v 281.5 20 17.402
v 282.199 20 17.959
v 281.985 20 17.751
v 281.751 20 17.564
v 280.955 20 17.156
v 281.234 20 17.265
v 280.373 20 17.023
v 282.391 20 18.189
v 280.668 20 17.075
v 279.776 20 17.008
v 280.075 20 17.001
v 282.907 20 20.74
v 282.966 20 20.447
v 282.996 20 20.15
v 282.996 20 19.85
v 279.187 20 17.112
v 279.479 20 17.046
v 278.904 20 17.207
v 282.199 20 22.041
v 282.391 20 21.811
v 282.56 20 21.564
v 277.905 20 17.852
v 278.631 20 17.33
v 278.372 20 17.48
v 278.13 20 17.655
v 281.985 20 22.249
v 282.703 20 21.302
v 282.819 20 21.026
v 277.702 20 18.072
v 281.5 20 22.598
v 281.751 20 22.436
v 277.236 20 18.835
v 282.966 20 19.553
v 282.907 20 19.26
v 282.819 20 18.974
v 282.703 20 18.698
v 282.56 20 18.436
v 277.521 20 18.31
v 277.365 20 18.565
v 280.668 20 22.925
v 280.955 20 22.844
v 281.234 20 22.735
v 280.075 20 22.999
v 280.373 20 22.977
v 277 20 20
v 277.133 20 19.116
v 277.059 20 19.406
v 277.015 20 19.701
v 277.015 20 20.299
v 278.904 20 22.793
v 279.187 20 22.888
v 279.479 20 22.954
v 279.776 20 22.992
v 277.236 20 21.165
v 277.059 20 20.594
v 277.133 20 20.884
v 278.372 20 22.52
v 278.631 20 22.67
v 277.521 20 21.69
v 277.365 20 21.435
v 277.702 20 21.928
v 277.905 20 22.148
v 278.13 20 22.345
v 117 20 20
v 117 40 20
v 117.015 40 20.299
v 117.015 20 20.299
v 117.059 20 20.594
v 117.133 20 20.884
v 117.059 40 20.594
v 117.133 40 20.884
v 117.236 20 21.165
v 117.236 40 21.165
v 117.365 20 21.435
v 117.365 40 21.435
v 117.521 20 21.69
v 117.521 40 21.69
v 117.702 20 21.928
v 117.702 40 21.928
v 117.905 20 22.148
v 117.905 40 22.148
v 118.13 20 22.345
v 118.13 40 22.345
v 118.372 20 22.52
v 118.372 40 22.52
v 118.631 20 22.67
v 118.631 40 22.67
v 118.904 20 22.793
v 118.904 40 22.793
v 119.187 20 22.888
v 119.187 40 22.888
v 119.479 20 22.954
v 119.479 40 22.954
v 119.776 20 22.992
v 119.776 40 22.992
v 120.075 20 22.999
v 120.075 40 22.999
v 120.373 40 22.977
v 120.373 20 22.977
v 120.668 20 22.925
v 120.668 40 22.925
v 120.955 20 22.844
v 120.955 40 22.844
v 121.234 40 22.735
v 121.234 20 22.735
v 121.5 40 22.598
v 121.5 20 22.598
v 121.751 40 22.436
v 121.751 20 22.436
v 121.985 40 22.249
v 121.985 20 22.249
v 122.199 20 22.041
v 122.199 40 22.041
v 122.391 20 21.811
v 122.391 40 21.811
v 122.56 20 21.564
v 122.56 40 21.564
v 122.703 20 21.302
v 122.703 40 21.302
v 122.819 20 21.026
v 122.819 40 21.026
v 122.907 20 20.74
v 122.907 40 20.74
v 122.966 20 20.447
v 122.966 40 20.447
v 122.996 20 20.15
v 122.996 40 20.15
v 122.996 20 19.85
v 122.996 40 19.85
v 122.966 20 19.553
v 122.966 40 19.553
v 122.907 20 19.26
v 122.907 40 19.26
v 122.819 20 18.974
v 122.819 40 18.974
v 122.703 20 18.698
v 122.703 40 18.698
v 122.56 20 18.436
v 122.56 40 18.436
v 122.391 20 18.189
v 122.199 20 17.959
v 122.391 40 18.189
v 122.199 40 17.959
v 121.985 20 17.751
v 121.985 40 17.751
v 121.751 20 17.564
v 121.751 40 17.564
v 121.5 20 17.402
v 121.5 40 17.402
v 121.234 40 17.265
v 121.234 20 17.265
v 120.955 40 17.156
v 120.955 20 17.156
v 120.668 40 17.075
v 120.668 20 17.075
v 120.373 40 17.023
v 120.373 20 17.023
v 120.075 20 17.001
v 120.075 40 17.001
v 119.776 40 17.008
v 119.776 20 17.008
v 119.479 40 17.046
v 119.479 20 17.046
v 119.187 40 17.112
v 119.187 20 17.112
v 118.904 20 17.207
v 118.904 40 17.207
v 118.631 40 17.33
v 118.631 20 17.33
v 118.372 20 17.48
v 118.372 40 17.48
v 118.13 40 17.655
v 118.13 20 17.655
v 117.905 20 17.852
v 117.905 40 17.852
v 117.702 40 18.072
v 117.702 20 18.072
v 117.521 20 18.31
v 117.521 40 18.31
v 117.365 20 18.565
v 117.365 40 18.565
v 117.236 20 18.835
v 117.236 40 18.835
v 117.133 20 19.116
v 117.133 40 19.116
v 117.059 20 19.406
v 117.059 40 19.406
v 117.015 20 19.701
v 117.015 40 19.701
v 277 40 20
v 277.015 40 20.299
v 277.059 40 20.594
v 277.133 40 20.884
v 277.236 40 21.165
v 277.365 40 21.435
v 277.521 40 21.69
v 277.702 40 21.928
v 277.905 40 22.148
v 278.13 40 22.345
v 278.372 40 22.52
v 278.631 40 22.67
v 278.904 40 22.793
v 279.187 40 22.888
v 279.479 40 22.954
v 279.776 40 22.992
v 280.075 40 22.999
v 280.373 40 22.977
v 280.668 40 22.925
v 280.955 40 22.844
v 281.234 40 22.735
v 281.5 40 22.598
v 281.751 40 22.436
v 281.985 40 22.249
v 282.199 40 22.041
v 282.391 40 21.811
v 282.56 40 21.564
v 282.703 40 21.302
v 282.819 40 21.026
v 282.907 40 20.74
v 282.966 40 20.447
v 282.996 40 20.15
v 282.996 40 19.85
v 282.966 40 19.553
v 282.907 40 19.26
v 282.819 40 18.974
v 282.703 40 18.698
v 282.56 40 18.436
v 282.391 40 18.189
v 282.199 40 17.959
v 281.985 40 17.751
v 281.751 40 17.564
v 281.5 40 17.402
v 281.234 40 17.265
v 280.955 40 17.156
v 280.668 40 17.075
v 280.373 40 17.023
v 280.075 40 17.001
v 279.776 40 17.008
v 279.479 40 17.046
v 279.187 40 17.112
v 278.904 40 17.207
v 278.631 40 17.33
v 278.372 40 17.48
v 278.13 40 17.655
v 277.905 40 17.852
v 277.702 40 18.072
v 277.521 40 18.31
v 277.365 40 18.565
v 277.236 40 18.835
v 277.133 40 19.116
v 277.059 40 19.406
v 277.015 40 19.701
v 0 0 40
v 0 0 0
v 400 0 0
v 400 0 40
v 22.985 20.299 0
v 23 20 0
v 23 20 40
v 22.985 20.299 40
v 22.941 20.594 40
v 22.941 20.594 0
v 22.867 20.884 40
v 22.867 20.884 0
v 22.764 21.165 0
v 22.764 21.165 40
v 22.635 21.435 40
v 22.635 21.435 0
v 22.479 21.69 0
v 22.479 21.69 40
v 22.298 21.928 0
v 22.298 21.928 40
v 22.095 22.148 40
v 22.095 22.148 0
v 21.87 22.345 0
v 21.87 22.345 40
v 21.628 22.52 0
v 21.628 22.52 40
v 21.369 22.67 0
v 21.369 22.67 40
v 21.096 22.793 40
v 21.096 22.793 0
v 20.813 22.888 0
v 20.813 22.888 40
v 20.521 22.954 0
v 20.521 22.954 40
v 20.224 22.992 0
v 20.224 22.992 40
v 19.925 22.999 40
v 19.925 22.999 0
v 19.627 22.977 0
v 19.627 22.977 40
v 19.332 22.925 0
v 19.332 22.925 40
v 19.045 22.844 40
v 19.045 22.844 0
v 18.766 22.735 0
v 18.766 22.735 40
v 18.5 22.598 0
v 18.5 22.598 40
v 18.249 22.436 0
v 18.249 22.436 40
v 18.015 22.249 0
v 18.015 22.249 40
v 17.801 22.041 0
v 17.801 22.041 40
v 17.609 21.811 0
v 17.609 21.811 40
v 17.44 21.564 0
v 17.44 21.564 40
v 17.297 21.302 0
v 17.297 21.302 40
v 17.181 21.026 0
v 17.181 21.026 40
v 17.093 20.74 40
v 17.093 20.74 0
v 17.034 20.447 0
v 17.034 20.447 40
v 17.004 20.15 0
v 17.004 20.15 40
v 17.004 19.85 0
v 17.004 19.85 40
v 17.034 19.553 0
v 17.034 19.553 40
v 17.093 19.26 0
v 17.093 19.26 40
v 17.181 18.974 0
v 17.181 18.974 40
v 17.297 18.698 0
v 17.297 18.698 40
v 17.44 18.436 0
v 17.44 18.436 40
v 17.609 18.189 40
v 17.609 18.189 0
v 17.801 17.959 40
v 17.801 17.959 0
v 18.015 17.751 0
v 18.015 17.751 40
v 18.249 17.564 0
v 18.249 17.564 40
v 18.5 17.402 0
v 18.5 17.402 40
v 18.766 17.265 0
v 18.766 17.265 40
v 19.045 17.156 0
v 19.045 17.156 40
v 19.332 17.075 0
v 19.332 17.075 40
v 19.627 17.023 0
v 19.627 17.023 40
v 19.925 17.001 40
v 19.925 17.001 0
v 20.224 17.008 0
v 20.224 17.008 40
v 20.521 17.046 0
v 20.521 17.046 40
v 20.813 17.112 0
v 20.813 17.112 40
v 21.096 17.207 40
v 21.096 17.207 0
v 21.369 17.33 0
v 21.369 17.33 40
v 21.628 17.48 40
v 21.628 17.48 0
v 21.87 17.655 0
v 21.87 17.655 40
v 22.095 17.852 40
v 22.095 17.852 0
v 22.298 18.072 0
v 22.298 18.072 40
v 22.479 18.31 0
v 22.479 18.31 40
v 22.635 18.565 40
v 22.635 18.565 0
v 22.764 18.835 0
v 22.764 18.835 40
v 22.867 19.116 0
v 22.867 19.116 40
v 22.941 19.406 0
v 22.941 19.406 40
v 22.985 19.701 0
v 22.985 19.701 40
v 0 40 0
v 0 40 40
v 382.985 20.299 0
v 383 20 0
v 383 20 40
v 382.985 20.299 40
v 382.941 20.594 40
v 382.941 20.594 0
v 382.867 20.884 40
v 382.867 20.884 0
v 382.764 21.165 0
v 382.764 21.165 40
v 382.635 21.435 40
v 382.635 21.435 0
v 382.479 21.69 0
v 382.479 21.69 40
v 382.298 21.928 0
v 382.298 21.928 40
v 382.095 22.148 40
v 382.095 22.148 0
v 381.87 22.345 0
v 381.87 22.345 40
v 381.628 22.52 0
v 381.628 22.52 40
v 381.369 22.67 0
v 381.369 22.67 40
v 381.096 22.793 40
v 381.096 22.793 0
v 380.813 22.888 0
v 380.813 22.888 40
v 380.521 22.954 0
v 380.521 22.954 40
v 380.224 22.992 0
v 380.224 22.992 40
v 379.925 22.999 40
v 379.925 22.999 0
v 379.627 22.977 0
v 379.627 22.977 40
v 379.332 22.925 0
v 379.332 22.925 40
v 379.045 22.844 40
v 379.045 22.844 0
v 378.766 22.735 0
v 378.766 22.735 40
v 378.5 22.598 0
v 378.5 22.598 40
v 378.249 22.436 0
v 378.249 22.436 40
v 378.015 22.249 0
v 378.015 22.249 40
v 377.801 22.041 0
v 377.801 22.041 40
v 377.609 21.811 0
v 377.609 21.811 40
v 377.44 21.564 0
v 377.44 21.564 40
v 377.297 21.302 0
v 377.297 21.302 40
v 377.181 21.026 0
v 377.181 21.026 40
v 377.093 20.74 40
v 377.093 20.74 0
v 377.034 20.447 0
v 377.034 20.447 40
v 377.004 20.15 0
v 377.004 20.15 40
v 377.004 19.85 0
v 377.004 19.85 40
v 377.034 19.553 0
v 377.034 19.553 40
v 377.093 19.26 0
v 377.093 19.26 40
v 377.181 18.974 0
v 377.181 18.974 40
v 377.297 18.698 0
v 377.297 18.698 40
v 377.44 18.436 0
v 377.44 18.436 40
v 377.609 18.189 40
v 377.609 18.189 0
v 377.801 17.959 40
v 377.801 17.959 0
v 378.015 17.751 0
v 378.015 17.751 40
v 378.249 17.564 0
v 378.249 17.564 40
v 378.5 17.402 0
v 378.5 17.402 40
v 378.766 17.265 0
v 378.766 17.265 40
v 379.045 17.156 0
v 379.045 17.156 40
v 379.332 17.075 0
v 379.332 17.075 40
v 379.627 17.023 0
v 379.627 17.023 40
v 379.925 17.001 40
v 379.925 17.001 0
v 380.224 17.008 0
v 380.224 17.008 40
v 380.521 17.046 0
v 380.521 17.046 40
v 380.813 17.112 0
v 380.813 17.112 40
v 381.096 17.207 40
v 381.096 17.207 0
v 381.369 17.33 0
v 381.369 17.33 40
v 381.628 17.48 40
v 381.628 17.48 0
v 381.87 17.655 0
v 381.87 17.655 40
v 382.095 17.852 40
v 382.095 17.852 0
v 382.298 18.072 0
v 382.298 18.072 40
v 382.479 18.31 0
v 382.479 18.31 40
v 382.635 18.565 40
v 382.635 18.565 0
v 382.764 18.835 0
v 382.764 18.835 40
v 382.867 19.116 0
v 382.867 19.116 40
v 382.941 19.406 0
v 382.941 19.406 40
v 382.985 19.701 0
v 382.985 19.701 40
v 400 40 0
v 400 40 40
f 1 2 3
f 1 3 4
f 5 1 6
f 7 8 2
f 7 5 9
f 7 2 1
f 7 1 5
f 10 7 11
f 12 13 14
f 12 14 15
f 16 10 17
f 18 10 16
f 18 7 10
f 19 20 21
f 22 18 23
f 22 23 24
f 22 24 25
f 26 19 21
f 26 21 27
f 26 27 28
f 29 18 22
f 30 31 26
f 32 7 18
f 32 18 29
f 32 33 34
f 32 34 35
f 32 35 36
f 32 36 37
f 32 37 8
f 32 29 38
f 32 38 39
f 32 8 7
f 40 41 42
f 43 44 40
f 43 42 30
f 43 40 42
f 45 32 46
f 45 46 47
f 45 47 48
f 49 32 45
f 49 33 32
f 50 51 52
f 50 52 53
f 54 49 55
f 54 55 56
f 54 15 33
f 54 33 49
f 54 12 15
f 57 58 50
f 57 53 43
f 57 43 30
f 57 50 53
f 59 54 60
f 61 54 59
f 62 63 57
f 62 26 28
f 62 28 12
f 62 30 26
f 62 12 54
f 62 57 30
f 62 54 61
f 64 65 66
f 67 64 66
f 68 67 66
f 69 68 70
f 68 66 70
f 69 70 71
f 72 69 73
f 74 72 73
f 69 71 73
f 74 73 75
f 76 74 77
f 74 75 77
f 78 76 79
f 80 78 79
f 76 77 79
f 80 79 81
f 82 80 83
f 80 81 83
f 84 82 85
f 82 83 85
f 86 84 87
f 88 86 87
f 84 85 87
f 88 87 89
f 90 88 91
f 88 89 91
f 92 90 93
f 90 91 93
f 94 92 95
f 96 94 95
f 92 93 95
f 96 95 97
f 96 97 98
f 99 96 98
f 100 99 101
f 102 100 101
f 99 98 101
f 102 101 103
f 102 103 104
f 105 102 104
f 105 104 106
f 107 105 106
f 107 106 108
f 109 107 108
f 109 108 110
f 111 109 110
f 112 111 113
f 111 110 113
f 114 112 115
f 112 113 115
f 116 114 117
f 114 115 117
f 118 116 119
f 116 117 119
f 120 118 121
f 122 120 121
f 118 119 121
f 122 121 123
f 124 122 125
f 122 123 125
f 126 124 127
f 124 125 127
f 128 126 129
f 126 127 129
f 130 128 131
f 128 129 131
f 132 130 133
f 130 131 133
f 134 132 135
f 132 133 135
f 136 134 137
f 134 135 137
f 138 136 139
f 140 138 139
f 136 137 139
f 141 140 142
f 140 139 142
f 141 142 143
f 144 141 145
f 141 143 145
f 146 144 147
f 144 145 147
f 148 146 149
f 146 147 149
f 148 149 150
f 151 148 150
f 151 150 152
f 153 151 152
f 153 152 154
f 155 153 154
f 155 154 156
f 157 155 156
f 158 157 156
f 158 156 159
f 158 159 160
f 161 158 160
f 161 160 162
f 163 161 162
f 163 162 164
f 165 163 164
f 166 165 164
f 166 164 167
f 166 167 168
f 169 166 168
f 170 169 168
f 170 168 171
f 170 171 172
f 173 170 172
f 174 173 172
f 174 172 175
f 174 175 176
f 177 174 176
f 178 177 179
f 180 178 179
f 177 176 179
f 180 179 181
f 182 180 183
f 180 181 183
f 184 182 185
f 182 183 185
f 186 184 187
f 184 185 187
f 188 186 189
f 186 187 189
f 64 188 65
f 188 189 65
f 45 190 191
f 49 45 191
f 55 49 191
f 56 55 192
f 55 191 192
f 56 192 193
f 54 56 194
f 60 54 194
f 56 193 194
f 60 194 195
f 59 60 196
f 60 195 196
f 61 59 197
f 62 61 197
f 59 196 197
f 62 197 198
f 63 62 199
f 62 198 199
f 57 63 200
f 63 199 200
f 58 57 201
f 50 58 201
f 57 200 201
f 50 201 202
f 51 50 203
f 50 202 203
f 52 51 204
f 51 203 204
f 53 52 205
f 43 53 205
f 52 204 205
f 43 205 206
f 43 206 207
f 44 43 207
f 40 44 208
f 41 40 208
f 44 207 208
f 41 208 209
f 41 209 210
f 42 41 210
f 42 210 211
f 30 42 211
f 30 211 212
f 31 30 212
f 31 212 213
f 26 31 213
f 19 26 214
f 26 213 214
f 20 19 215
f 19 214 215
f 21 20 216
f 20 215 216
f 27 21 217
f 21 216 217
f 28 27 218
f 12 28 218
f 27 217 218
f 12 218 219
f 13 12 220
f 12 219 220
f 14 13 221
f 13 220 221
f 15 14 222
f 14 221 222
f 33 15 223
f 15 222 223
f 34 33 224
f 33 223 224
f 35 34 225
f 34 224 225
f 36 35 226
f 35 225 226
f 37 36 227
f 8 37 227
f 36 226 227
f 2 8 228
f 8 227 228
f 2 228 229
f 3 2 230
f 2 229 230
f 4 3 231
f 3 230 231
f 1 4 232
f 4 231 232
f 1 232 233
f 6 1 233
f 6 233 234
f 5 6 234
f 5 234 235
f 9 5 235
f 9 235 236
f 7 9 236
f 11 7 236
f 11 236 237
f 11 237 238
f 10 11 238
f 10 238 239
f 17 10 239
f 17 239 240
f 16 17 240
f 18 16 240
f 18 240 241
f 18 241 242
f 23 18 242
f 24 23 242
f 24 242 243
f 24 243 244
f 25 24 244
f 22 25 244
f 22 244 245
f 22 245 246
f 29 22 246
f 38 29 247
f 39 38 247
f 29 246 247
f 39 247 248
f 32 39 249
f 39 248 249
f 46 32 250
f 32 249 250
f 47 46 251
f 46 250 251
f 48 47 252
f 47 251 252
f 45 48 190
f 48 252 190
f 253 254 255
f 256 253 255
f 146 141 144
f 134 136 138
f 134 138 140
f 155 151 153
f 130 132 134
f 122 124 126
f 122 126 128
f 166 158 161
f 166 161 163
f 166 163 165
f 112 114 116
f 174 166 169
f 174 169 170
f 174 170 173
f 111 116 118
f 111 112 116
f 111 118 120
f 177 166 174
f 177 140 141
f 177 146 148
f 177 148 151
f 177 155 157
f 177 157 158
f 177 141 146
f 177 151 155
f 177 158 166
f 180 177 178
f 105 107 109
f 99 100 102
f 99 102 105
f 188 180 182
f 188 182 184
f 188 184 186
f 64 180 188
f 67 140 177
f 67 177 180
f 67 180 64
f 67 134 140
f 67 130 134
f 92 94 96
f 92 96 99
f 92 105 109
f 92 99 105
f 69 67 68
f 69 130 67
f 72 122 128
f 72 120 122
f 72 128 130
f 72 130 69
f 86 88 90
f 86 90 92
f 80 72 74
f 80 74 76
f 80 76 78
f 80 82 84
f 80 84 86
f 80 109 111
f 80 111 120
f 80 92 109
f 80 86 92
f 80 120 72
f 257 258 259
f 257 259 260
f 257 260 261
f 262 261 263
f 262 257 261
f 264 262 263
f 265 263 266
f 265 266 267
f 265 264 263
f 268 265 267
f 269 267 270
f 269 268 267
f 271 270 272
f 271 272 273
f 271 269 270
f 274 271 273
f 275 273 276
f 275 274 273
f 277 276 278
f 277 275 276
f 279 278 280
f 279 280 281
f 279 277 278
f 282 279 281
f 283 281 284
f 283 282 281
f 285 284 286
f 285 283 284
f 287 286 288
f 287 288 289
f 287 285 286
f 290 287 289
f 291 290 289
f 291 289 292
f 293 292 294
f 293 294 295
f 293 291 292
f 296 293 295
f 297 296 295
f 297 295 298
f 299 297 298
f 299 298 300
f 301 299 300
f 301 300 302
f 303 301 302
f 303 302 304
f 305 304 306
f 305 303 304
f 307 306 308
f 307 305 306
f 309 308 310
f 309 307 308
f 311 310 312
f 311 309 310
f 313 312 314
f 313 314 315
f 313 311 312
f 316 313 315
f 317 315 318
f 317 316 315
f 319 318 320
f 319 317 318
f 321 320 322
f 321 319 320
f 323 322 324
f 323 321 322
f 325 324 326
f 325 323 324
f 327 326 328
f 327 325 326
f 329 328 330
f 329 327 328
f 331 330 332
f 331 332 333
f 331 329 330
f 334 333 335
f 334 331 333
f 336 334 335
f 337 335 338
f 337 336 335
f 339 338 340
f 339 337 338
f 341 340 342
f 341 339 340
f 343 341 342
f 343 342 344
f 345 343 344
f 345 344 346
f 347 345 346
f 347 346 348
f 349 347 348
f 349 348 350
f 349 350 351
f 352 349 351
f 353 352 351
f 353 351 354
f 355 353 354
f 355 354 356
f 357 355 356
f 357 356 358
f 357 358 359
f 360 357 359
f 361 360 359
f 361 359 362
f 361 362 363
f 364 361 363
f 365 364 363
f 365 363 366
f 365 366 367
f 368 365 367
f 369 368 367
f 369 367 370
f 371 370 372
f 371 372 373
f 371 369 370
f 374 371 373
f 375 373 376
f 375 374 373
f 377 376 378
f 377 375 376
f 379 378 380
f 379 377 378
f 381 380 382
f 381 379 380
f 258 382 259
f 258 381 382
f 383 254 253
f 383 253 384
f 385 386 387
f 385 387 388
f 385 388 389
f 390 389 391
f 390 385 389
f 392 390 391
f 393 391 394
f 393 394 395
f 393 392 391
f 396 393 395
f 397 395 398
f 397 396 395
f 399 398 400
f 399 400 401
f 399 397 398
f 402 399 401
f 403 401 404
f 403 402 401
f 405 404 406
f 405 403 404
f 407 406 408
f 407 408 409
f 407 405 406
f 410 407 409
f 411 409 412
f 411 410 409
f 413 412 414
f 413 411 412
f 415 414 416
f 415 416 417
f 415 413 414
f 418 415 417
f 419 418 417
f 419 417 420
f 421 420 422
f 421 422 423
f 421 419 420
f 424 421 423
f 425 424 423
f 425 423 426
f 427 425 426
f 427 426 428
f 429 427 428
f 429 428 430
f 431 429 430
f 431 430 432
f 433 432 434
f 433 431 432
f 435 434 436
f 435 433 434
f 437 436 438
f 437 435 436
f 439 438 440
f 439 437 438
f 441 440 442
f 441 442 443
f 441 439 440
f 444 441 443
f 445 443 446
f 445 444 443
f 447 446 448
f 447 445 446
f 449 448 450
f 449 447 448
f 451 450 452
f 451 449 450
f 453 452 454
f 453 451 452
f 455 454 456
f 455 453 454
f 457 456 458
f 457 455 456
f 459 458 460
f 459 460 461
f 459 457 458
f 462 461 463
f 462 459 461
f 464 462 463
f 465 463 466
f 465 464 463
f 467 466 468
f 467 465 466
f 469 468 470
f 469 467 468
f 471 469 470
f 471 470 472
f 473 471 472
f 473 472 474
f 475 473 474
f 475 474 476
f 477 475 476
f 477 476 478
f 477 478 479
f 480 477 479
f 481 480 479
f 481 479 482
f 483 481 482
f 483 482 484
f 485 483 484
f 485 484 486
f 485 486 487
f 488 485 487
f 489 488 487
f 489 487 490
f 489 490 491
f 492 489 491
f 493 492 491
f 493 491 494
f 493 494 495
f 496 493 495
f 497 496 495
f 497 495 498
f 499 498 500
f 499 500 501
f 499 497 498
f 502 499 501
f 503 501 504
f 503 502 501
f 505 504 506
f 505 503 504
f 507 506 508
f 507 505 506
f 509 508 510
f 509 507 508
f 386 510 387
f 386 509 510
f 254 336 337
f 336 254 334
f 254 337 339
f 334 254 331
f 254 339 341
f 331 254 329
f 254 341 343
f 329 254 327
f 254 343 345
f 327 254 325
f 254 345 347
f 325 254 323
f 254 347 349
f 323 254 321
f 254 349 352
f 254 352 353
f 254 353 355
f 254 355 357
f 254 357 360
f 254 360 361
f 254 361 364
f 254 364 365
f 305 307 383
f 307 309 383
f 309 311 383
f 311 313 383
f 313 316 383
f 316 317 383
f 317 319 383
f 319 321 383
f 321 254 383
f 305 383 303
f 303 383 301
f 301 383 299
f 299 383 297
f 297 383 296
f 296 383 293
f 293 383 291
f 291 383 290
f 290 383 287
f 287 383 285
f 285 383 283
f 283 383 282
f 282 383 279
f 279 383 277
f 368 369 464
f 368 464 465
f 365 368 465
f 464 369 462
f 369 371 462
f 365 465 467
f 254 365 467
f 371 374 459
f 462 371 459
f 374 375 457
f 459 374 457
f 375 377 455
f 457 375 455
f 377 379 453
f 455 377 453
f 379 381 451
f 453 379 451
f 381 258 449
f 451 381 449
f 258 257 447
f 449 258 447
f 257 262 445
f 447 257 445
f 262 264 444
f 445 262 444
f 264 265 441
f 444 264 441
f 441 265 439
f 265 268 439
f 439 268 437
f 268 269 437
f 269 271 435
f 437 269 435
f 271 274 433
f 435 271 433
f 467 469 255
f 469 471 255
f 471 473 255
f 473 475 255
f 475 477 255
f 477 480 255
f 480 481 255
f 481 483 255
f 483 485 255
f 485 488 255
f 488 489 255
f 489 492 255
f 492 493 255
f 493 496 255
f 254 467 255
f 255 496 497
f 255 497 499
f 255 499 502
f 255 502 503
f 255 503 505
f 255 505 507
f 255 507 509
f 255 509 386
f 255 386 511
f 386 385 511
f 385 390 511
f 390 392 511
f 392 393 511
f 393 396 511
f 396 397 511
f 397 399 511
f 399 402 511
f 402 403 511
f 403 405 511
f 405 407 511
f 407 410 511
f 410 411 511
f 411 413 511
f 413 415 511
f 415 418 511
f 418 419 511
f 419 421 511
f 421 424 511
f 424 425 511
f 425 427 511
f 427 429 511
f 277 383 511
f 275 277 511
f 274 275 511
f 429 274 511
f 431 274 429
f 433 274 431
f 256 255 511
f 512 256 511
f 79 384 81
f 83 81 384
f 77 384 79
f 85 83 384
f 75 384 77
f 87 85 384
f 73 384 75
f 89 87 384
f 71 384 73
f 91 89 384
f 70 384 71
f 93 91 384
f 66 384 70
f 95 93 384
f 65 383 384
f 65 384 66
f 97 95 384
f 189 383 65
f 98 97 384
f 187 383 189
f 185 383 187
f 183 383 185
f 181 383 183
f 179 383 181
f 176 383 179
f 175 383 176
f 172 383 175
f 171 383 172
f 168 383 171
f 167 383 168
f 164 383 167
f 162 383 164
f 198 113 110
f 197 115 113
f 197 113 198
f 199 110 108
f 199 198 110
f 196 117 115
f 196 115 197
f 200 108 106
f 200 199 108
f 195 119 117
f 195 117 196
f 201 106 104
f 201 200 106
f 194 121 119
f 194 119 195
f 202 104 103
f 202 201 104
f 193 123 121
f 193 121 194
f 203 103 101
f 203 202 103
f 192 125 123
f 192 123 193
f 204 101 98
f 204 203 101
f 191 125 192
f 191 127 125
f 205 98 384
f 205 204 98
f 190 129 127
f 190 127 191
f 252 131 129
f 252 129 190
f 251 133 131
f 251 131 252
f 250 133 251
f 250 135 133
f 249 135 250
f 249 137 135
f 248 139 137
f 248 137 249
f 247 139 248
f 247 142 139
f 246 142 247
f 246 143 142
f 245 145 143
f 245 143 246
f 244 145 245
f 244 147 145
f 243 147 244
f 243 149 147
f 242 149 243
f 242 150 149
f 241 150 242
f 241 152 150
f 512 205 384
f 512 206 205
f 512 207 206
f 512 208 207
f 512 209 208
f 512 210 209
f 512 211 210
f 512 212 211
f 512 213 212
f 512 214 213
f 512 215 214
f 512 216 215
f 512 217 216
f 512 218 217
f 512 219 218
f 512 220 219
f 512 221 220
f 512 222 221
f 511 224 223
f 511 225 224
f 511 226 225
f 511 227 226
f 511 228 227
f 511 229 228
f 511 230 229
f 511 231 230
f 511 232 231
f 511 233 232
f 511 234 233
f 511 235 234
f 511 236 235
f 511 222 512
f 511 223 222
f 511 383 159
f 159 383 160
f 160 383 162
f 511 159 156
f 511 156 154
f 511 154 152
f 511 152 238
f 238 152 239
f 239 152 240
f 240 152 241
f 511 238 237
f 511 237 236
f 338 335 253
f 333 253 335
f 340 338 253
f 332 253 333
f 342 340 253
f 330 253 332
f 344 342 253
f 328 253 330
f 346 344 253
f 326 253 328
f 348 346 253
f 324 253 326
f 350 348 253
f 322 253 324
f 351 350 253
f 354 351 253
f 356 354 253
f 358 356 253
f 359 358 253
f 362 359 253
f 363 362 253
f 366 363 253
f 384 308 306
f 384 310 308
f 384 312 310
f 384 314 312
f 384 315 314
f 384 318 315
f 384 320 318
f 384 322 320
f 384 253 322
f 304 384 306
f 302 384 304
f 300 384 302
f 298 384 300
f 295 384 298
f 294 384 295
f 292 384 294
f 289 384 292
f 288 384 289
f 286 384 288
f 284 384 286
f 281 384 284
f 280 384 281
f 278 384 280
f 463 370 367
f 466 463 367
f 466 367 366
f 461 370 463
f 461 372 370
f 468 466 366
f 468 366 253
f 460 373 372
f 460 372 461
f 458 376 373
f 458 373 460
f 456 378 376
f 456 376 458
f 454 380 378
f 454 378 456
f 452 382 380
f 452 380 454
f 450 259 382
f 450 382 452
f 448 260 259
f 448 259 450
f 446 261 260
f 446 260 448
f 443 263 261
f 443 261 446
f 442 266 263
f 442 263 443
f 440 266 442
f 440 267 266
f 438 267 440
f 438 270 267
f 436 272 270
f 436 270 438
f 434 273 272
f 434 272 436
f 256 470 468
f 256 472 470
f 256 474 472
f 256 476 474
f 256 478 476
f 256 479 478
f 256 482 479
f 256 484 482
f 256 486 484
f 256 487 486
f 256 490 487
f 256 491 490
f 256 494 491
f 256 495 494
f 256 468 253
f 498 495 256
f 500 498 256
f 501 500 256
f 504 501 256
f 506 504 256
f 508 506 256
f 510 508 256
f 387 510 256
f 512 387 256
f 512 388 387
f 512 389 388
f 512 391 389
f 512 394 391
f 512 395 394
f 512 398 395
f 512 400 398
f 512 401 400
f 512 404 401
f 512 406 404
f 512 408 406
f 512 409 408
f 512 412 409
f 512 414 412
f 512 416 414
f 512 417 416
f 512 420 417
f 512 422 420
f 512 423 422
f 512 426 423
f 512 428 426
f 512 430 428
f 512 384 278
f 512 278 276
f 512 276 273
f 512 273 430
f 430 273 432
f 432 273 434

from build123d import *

# Parameters (mm, degrees)
F0_W     = 400
F0_H     = 40
F0_R     = 3
F1_DEPTH = 40
F2_R     = 3
F4_DEPTH = 20
F3_R     = 3
F5_DEPTH = 20


with BuildPart() as f1:
    # F0 (on Top) → F1 (new body)
    with BuildSketch(Plane.XY):
        with Locations((200, 20)):
            Rectangle(F0_W, F0_H)
        with Locations((20, 20)):
            Circle(F0_R, mode=Mode.SUBTRACT)
        with Locations((380, 20)):
            Circle(F0_R, mode=Mode.SUBTRACT)
    extrude(amount=F1_DEPTH)

    # F2 (on face) → F4 (cut)
    with BuildSketch(Plane(origin=(0, 40, 0), x_dir=(-1, 0, 0), z_dir=(0, 1, 0))):
        with Locations((-120, 20)):
            Circle(F2_R)
    extrude(amount=-F4_DEPTH, mode=Mode.SUBTRACT)

    # F3 (on face) → F5 (cut)
    with BuildSketch(Plane(origin=(0, 40, 0), x_dir=(-1, 0, 0), z_dir=(0, 1, 0))):
        with Locations((-280, 20)):
            Circle(F3_R)
    extrude(amount=-F5_DEPTH, mode=Mode.SUBTRACT)


solid = f1.part
